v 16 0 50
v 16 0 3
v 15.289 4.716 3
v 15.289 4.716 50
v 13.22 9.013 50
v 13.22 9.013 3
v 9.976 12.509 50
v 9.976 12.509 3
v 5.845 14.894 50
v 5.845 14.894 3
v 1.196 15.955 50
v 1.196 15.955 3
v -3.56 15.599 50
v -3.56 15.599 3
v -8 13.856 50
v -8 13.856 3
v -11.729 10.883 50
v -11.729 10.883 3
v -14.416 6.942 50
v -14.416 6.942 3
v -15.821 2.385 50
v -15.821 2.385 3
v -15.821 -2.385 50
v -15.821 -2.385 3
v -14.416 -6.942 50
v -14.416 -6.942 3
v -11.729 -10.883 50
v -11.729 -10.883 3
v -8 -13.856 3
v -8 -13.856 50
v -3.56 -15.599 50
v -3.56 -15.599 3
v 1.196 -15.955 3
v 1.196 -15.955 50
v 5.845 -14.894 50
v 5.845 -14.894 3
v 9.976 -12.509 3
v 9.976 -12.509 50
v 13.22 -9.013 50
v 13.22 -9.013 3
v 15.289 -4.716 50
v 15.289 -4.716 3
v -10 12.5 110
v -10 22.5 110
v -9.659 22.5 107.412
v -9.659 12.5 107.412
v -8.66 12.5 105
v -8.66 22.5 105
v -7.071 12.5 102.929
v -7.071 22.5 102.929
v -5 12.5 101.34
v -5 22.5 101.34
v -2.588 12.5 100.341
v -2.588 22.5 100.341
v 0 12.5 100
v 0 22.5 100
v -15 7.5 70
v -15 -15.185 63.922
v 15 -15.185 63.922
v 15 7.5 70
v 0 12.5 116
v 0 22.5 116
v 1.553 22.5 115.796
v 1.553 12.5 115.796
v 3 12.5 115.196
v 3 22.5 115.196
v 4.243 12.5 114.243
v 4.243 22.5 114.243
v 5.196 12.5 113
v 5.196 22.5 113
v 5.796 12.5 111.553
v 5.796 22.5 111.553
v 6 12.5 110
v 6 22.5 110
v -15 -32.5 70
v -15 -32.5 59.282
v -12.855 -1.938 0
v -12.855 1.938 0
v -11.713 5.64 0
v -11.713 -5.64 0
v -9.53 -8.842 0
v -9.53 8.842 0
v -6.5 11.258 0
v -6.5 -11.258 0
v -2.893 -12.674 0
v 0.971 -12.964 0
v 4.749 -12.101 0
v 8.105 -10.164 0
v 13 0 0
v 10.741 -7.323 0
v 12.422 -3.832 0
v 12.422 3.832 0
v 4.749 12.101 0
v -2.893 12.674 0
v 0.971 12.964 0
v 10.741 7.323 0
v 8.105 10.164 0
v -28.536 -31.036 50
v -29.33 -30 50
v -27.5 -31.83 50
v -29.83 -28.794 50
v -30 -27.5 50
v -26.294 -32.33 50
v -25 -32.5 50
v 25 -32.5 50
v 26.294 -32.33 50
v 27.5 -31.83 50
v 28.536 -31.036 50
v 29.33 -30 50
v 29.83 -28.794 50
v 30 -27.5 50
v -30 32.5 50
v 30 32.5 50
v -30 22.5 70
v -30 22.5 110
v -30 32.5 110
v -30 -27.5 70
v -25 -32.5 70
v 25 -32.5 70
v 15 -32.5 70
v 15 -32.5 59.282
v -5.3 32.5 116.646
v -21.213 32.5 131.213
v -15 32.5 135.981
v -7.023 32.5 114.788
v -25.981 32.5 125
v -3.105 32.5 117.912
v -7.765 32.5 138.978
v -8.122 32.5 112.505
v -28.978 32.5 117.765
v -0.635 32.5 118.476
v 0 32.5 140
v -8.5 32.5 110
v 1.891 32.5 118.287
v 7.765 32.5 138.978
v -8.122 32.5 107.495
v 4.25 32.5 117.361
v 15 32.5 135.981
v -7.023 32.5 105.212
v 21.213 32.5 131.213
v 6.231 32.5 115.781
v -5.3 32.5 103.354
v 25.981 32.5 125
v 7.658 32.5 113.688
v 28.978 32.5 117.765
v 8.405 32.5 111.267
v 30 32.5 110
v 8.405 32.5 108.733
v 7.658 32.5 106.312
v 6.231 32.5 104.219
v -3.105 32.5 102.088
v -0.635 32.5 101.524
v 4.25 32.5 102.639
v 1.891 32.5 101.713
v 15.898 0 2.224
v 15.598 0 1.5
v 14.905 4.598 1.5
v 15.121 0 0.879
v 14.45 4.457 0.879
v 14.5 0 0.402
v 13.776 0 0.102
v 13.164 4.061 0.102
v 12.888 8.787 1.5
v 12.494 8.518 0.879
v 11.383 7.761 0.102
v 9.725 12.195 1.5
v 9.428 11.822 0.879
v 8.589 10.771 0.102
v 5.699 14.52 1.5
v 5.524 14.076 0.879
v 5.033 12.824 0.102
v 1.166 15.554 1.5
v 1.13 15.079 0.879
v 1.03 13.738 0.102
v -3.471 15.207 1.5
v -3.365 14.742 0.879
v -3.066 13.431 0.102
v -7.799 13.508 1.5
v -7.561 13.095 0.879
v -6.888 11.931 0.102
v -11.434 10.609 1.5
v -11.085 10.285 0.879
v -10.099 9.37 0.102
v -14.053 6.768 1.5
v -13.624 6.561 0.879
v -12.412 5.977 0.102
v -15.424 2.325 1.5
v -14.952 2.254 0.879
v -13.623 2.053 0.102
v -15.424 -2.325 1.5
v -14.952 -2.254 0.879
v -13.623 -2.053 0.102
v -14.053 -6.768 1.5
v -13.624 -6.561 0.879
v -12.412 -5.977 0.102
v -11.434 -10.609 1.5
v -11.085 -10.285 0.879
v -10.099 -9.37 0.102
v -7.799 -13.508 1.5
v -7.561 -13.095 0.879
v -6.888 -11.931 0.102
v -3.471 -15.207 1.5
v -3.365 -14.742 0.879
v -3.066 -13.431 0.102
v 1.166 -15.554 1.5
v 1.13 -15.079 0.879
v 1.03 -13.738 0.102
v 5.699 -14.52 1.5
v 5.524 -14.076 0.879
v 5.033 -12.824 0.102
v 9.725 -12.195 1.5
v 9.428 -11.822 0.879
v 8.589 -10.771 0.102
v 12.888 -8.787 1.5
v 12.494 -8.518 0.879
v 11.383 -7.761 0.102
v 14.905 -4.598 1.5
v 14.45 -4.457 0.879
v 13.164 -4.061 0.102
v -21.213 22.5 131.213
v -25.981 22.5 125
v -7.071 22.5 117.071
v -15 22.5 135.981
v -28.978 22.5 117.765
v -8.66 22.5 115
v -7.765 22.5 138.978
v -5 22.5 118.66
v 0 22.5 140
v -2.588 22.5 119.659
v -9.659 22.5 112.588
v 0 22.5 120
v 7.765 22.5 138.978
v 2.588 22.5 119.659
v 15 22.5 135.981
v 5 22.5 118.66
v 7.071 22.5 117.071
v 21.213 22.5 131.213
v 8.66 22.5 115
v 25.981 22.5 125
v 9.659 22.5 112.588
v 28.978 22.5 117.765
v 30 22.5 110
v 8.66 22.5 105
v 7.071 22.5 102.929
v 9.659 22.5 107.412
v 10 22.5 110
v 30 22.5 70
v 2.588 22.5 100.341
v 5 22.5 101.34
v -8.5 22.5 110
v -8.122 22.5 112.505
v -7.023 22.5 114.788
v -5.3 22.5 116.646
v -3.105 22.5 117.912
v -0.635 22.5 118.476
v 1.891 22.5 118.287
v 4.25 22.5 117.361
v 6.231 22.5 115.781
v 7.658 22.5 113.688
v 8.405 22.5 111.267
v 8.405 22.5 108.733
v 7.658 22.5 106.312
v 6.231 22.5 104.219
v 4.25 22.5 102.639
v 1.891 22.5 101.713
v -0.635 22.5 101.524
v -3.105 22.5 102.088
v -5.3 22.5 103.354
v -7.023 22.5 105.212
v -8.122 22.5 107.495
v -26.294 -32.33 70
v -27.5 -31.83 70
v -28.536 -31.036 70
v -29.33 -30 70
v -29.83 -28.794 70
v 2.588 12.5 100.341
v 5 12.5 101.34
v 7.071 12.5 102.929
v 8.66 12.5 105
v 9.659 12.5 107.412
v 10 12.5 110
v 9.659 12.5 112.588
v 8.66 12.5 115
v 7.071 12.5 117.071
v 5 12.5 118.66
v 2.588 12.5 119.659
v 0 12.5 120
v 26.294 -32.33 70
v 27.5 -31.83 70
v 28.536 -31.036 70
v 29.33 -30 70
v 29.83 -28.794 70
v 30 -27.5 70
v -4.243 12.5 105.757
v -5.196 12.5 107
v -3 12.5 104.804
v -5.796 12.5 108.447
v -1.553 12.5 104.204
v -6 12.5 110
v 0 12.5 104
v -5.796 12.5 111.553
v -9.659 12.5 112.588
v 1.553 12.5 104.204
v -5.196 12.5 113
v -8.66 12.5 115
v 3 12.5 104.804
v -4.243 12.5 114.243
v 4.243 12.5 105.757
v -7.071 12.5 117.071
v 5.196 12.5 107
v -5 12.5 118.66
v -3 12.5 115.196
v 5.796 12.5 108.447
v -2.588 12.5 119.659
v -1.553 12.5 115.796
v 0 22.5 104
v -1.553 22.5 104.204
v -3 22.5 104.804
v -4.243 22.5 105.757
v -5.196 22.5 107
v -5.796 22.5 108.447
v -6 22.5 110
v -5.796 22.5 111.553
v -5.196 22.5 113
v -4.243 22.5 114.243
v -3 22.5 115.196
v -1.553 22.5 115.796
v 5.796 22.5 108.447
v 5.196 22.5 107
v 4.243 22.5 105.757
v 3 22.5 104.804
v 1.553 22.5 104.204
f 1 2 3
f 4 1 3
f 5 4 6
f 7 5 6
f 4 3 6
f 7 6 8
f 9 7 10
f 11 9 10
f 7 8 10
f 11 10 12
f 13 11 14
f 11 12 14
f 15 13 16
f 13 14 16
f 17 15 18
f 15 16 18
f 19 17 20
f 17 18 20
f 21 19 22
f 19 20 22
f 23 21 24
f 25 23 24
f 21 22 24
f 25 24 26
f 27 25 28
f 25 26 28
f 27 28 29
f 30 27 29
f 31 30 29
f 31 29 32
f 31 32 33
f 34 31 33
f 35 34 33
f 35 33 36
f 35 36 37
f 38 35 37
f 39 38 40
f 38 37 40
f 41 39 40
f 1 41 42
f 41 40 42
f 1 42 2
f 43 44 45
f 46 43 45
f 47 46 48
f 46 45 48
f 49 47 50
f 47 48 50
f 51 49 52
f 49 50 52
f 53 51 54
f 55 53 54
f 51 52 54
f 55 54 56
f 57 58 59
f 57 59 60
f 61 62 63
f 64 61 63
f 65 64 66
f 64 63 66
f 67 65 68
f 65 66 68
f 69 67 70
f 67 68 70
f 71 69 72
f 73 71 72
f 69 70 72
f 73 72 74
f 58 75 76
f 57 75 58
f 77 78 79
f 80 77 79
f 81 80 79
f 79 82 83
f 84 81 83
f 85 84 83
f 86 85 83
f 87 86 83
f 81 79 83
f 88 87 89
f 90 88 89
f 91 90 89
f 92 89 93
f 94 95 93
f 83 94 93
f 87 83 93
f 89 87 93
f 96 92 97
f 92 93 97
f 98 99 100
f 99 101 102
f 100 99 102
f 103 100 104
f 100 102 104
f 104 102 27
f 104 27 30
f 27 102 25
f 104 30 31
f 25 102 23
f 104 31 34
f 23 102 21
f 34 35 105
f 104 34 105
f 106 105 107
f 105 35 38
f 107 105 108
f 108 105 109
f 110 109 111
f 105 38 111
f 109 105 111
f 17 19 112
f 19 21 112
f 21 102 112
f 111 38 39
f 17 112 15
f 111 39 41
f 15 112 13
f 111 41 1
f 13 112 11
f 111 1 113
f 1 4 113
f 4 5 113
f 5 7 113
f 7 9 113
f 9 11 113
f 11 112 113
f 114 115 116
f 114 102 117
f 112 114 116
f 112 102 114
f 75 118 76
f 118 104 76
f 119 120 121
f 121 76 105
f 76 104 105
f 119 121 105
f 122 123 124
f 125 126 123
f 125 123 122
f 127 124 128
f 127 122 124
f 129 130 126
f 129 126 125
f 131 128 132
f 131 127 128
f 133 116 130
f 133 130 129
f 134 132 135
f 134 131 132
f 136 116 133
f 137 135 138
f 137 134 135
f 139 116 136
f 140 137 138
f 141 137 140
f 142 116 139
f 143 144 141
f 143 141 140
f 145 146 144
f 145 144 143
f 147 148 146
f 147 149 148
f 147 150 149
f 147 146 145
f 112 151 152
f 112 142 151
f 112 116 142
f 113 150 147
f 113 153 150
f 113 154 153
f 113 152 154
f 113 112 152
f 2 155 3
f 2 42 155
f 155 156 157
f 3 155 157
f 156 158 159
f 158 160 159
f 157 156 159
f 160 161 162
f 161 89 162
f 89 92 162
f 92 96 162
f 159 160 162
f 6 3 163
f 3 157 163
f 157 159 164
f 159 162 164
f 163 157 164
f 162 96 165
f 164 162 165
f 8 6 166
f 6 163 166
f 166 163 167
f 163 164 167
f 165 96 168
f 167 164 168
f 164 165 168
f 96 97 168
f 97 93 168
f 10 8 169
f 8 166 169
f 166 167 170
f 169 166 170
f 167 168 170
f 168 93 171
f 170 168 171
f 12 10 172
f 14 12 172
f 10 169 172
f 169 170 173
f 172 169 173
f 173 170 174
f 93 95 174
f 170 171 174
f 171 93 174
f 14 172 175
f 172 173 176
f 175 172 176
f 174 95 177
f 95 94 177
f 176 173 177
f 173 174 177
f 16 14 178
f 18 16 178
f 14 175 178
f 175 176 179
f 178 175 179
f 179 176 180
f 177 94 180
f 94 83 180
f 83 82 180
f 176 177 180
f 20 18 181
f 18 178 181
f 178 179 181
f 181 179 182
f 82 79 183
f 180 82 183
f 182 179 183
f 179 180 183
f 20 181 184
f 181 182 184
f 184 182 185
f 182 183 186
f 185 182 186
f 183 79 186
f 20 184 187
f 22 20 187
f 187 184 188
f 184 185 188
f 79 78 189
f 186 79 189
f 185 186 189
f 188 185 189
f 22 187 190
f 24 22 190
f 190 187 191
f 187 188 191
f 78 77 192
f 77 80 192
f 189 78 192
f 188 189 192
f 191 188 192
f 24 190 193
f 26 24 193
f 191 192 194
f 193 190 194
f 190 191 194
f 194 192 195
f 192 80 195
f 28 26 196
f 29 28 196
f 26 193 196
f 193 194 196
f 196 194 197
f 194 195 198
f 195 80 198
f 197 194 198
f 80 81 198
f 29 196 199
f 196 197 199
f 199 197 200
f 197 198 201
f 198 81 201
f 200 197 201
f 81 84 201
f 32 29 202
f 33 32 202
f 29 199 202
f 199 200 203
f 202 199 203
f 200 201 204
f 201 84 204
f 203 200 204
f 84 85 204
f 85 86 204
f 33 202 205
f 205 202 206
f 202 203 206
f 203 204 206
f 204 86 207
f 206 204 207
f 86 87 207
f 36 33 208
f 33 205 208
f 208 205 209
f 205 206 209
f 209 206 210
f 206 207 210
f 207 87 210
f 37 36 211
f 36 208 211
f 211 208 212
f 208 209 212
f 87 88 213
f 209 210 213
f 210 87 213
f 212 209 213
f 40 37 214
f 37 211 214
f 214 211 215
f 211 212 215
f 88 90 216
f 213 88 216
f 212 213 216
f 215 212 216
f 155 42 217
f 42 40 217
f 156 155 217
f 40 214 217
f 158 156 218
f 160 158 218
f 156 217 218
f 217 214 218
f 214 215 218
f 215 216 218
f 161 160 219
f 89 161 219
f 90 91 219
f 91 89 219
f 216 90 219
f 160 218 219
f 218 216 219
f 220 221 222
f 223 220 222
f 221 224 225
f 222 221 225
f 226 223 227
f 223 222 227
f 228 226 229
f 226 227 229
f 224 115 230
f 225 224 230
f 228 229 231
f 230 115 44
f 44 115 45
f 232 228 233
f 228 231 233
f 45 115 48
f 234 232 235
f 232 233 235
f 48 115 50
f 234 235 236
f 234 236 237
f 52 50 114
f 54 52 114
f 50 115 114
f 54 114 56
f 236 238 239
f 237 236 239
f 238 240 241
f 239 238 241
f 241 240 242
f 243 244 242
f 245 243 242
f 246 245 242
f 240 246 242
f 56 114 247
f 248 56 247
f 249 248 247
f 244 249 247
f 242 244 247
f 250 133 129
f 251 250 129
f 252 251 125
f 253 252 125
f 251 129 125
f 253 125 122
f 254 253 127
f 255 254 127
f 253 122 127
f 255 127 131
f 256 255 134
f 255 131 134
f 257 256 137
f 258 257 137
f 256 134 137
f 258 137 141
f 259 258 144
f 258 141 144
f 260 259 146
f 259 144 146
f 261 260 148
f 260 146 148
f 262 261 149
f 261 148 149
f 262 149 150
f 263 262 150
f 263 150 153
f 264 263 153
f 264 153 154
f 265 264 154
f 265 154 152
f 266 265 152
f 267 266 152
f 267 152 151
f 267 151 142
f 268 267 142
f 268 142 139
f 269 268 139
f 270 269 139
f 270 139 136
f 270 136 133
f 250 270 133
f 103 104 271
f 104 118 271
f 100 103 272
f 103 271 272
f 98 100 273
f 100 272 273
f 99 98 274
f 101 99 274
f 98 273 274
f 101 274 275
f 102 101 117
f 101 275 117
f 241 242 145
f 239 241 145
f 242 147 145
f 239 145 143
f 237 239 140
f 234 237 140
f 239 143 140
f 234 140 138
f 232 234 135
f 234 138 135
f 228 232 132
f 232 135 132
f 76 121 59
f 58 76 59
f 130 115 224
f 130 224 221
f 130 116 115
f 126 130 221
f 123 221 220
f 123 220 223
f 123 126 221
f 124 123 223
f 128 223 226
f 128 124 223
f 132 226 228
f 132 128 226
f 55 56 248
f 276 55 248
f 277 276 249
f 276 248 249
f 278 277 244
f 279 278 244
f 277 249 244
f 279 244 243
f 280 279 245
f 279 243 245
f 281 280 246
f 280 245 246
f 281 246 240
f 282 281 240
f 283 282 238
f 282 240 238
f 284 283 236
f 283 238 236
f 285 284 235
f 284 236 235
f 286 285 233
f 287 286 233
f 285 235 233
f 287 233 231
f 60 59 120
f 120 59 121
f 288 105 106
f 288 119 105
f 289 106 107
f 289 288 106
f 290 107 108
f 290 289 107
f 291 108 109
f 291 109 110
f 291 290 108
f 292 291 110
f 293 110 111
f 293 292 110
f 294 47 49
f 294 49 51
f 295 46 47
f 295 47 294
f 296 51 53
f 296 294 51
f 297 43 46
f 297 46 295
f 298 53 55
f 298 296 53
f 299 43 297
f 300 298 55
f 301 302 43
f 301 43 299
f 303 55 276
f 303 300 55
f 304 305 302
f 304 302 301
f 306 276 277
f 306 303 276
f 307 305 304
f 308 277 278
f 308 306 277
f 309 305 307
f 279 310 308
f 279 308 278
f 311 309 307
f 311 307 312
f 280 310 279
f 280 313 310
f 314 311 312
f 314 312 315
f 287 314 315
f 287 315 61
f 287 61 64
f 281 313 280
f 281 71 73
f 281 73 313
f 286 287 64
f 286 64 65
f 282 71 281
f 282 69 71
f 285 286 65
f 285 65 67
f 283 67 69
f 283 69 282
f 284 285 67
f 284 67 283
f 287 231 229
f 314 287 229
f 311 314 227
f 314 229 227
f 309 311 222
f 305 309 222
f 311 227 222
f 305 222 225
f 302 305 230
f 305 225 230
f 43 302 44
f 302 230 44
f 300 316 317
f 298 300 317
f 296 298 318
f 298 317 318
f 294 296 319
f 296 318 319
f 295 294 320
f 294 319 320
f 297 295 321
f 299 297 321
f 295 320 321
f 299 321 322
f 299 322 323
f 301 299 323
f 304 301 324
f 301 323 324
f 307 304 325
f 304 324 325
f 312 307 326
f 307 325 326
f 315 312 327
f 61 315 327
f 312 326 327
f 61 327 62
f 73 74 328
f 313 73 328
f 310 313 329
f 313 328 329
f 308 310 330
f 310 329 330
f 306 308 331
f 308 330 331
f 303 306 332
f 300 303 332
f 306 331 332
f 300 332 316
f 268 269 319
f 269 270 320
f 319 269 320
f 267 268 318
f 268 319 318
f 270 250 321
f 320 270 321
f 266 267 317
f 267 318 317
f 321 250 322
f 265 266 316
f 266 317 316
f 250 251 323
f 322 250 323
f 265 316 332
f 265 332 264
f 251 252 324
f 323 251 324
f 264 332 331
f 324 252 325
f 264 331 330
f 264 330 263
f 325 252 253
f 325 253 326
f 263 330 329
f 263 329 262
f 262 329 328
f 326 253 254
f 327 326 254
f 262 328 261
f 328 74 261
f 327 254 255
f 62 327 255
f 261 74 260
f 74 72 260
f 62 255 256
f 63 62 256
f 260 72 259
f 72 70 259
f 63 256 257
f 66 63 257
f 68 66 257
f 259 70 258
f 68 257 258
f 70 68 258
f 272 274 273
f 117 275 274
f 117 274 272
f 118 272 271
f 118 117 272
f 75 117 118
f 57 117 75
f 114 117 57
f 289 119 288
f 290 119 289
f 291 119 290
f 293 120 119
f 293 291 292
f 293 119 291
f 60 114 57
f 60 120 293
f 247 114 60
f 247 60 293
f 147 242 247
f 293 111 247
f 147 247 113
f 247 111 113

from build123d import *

# Parameters (mm, degrees)
F0_R      = 16
F1_DEPTH  = 50
F3_DEPTH  = 20
F4_DEPTH  = 20
F6_DEPTH  = 30
F7_DEPTH  = 40
F8_W      = 60
F8_H      = 10
F9_DEPTH  = 70
F10_R     = 29.99999
F11_R     = 3
F12_R     = 5
F14_D     = 17
F15_DEPTH = 10


# Not quite as in the source:
# - a fillet or chamfer is up to 0.001 mm smaller than in the source, because OpenCascade refuses the exact size


with BuildPart() as f1:
    # F0 (on Top) → F1 (new body)
    with BuildSketch(Plane.XY):
        Circle(F0_R)
    extrude(amount=F1_DEPTH)

    # F2 (on face) → F3 (join)
    with BuildSketch(Plane.XY.offset(50)):
        with BuildLine():
            Line((-30, 32.5), (-30, 7.5))
            Line((-30, 7.5), (-14.1332940251, 7.5))
            ThreePointArc((-14.1332940251, 7.5), (0, 16), (14.1332940251, 7.5))
            Line((14.1332940251, 7.5), (15, 7.5))
            Line((15, 7.5), (30, 7.5))
            Line((30, 7.5), (30, 32.5))
            Line((30, 32.5), (0, 32.5))
            Line((0, 32.5), (-30, 32.5))
        make_face()
        with BuildLine():
            ThreePointArc((14.1332940251, 7.5), (0, 16), (-14.1332940251, 7.5))
            Line((-14.1332940251, 7.5), (14.1332940251, 7.5))
        make_face()
    extrude(amount=F3_DEPTH)

    # F2 (on face) → F4 (join)
    with BuildSketch(Plane.XY.offset(50)):
        with BuildLine():
            Line((15, 5.5677643628), (15, -5.5677643628))
            ThreePointArc((15, -5.5677643628), (15.748015748, -2.8284271247), (16, 0))
            ThreePointArc((16, 0), (15.748015748, 2.8284271247), (15, 5.5677643628))
        make_face()
        with BuildLine():
            ThreePointArc((16, 0), (15.748015748, -2.8284271247), (15, -5.5677643628))
            Line((15, -5.5677643628), (15, -32.5))
            Line((15, -32.5), (30, -32.5))
            Line((30, -32.5), (30, 0))
            Line((30, 0), (30, 7.5))
            Line((30, 7.5), (15, 7.5))
            Line((15, 7.5), (15, 5.5677643628))
            ThreePointArc((15, 5.5677643628), (15.748015748, 2.8284271247), (16, 0))
        make_face()
    extrude(amount=F4_DEPTH)

    # F5 (on face) → F6 (join)
    with BuildSketch(Plane(origin=(15, 0, 0), x_dir=(0, -1, 0), z_dir=(-1, 0, 0))):
        Polygon((3.8423609018, 66.9608235561), (-7.5, 70), (-7.5, 50), (-5.5677643628, 50), (5.5677643628, 50), (32.5, 50), (32.5, 59.2820323028), (15.1847218036, 63.9216471122), align=None)
    extrude(amount=F6_DEPTH)

    # F7 (add): a face of the model
    f7_faces = [f1.faces().sort_by_distance(p)[0] for p in [
        (-22.5, 7.5, 60),
    ]]
    extrude(f7_faces, amount=F7_DEPTH)

    # F8 (on face) → F9 (join)
    with BuildSketch(Plane.XY.offset(70)):
        with Locations((0, 27.5)):
            Rectangle(F8_W, F8_H)
    extrude(amount=F9_DEPTH)

    # F10 (radius 30 in the source; OpenCascade refuses exactly that, so slightly less here)
    f10_edges = [f1.edges().sort_by_distance(p)[0] for p in [
        (-30, 27.5, 140),
        (30, 27.5, 140),
    ]]
    fillet(f10_edges, radius=F10_R)

    # F11
    f11_edges = [f1.edges().sort_by_distance(p)[0] for p in [
        (-16, 0, 0),
    ]]
    fillet(f11_edges, radius=F11_R)

    # F12
    f12_edges = [f1.edges().sort_by_distance(p)[0] for p in [
        (-30, -32.5, 60),
        (30, -32.5, 60),
    ]]
    fillet(f12_edges, radius=F12_R)

    # F14 (through all)
    with Locations(Plane.XZ.offset(-22.5)):
        with Locations((0, 110)):
            Hole(F14_D / 2)

    # F13 (on face) → F15 (join)
    with BuildSketch(Plane.XZ.offset(-22.5)):
        with BuildLine():
            Line((-6, 110), (-10, 110))
            ThreePointArc((-10, 110), (-7.0710678119, 102.9289321881), (0, 100))
            Line((0, 100), (0, 104))
            ThreePointArc((0, 104), (-4.2426406871, 105.7573593129), (-6, 110))
        make_face()
        with BuildLine():
            Line((0, 116), (0, 120))
            ThreePointArc((0, 120), (-7.0710678119, 117.0710678119), (-10, 110))
            Line((-10, 110), (-6, 110))
            ThreePointArc((-6, 110), (-4.2426406871, 114.2426406871), (0, 116))
        make_face()
        with BuildLine():
            ThreePointArc((10, 110), (7.0710678119, 117.0710678119), (0, 120))
            Line((0, 120), (0, 116))
            ThreePointArc((0, 116), (4.2426406871, 114.2426406871), (6, 110))
            Line((6, 110), (10, 110))
        make_face()
        with BuildLine():
            ThreePointArc((0, 100), (7.0710678119, 102.9289321881), (10, 110))
            Line((10, 110), (6, 110))
            ThreePointArc((6, 110), (4.2426406871, 105.7573593129), (0, 104))
            Line((0, 104), (0, 100))
        make_face()
    extrude(amount=F15_DEPTH)


solid = f1.part
